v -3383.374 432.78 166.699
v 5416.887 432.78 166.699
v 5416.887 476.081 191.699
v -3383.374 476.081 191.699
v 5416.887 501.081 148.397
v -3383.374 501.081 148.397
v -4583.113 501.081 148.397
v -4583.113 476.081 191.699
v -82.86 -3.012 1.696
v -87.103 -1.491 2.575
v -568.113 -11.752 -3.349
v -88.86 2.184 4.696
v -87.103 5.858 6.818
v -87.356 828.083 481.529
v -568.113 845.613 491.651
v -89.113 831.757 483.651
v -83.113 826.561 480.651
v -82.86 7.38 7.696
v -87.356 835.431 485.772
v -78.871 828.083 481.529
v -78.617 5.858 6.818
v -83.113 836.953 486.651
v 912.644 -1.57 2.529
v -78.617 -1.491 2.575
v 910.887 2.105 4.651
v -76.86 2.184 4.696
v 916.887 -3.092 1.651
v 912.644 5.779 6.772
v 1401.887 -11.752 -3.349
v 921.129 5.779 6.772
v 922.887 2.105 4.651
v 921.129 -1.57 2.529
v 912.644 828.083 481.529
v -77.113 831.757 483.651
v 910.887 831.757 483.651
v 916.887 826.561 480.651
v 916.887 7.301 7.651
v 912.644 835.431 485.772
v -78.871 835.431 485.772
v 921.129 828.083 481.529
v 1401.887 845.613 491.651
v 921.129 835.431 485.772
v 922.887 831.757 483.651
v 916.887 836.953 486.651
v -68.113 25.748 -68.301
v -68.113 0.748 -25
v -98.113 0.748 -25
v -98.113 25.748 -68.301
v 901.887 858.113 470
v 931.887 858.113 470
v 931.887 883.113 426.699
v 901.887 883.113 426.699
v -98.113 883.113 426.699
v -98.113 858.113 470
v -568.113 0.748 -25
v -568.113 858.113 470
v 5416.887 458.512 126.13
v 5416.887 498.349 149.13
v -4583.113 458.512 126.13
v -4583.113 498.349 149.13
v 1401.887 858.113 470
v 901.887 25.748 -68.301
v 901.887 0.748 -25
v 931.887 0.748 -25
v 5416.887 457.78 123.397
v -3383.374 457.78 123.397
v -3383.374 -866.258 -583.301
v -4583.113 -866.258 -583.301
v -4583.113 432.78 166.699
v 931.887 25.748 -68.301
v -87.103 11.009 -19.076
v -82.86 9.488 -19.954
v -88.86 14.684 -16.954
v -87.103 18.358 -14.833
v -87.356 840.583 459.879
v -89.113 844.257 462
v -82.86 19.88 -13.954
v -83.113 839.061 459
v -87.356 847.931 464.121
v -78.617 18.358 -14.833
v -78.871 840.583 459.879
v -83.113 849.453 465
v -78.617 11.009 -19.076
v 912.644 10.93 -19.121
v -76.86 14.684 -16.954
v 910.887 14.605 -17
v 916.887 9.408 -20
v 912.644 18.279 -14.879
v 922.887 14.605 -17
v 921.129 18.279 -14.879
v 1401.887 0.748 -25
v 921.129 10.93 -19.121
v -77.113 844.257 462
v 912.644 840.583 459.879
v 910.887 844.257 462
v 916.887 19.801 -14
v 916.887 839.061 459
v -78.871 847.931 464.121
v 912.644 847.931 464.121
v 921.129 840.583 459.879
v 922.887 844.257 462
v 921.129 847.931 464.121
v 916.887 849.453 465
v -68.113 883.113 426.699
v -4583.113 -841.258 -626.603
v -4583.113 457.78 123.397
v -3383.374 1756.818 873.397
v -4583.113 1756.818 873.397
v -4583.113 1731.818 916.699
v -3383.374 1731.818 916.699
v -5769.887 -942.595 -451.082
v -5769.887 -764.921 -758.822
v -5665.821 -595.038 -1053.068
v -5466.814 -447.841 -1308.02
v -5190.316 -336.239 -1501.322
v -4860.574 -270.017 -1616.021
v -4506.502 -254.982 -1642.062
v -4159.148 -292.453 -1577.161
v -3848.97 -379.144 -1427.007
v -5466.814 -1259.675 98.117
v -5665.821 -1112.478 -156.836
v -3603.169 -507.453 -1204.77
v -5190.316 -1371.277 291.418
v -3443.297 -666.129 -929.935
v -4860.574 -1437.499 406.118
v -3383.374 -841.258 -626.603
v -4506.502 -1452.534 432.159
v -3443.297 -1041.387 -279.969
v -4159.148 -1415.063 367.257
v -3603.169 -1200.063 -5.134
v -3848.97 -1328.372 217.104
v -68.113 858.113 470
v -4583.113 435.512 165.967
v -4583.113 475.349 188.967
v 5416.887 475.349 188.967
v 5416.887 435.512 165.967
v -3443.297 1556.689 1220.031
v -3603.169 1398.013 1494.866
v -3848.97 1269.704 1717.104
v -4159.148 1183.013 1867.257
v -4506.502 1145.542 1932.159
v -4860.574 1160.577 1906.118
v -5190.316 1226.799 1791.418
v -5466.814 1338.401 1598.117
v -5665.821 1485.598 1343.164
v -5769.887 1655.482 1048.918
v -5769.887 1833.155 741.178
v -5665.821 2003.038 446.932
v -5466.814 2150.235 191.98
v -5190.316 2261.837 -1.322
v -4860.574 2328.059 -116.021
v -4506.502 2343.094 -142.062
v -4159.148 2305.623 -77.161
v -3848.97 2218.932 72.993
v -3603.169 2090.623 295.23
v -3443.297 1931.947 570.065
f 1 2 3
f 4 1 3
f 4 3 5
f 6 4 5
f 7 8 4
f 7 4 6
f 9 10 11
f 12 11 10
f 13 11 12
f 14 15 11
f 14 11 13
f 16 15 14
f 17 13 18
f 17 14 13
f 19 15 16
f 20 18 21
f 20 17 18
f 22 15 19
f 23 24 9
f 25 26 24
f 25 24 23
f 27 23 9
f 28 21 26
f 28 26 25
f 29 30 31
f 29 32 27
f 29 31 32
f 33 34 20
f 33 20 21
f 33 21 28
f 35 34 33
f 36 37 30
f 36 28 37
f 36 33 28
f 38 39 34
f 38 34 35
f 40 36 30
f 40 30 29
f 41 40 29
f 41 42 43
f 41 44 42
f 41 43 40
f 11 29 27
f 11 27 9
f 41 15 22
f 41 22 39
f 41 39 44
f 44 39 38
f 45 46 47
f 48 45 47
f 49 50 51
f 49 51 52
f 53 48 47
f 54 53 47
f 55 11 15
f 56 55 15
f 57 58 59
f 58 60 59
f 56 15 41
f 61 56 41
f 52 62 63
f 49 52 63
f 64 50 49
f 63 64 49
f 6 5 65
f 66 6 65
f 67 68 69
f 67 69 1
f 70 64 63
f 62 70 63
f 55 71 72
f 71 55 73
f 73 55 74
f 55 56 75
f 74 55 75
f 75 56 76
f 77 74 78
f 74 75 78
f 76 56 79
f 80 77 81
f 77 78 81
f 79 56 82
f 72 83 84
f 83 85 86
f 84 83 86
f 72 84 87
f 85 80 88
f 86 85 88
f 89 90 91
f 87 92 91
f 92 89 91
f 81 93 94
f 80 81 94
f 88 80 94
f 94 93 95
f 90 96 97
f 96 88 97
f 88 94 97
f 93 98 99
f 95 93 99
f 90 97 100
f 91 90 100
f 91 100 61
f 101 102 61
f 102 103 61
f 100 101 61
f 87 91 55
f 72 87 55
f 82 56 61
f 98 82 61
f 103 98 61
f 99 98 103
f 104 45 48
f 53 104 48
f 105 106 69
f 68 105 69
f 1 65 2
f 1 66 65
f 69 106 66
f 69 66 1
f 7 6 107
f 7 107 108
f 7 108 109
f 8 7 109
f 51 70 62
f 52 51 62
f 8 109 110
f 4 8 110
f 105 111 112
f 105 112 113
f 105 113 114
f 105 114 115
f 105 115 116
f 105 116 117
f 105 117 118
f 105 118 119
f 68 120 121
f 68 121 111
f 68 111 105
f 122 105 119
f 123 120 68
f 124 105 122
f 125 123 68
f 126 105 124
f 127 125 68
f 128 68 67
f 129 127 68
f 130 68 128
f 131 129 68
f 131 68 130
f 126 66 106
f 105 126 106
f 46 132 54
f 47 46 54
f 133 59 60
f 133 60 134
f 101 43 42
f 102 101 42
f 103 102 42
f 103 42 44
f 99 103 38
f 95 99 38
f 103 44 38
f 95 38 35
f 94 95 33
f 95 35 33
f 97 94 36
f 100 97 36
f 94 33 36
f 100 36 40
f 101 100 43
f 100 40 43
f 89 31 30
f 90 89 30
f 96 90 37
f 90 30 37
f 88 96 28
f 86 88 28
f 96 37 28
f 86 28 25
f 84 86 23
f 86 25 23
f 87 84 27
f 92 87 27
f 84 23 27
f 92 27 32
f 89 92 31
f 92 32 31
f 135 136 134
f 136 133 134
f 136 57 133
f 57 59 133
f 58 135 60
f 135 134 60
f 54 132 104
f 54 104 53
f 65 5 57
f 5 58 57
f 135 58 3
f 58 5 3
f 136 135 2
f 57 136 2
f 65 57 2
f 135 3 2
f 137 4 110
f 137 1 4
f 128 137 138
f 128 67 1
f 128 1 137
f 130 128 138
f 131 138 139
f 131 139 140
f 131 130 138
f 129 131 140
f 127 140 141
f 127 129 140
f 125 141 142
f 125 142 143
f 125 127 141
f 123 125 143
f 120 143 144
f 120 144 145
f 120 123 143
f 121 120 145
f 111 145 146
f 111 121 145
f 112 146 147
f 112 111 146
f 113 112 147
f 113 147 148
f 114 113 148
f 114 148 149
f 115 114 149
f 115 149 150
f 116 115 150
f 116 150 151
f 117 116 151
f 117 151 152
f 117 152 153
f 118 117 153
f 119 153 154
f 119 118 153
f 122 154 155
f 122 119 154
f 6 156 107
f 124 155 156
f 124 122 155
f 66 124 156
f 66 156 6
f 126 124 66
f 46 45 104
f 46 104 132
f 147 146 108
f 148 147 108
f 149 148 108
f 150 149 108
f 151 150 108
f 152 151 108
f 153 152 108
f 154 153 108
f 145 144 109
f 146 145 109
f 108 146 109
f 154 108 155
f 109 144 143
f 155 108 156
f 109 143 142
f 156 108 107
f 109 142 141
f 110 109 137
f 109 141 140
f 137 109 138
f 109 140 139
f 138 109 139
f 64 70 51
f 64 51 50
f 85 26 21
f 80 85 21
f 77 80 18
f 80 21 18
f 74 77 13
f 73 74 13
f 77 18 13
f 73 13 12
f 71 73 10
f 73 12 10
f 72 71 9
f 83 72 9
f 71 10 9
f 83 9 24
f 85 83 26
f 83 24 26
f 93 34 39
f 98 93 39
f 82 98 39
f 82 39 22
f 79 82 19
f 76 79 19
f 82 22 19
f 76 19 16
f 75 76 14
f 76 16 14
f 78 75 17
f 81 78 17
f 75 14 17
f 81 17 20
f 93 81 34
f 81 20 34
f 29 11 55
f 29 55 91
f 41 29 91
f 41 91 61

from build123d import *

# Parameters (mm, degrees)
F0_W          = 1970
F0_H          = 990
F0_R          = 6
F1_DEPTH      = 25
F2_ANGLE      = 30
F3_W          = 30
F3_H          = 50
F4_DEPTH      = 990
F6_DEPTH      = 4015
F6_DEPTH_BACK = 5985
F7_T          = -2
F9_DEPTH      = 1500


with BuildPart() as f1:
    # F0 (on Top) → F1 (new body)
    with BuildSketch(Plane.XY):
        with Locations((416.8867363036, 495.7481575012)):
            Rectangle(F0_W, F0_H)
        with Locations((-82.8598737717, 16.8394874781)):
            Circle(F0_R, mode=Mode.SUBTRACT)
        with Locations((916.8867363036, 16.7481575012)):
            Circle(F0_R, mode=Mode.SUBTRACT)
        with Locations((-83.1132636964, 974.7481575012)):
            Circle(F0_R, mode=Mode.SUBTRACT)
        with Locations((916.8867363036, 974.7481575012)):
            Circle(F0_R, mode=Mode.SUBTRACT)
    extrude(amount=-F1_DEPTH)


with BuildPart() as f1_1:
    # F2: moved
    add(f1.part.rotate(Axis((416.8867363036, 0.7481575012, -25), (1, 0, 0)), F2_ANGLE))


with BuildPart() as f4:
    # F3 (on face) → F4 (new body)
    with BuildSketch(Plane(origin=(0, 847.1009503252, 489.073961701), x_dir=(-1, 0, 0), z_dir=(0, 0.8660254038, 0.5))):
        with Locations((83.1132636964, -47.0247138452)):
            Rectangle(F3_W, F3_H)
    extrude(amount=-F4_DEPTH)


with BuildPart() as f4b:
    # F3 (on face) → F4, piece 2 (new body)
    with BuildSketch(Plane(origin=(0, 847.1009503252, 489.073961701), x_dir=(-1, 0, 0), z_dir=(0, 0.8660254038, 0.5))):
        with Locations((-916.8867363036, -47.0247138452)):
            Rectangle(F3_W, F3_H)
    extrude(amount=-F4_DEPTH)


with BuildPart() as f6:
    # F5 (on face) → F6 (new body, two sides)
    with BuildSketch(Plane(origin=(-568.1132636964, 0, 0), x_dir=(0, -1, 0), z_dir=(-1, 0, 0))) as f6_sk:
        Polygon((-432.7800972799, 166.6987298108), (-454.4307323745, 179.1987298108), (-476.0813674691, 191.6987298108), (-501.0813674691, 148.3974596216), (-457.7800972799, 123.3974596216), align=None)
    extrude(amount=F6_DEPTH)
    extrude(f6_sk.sketch, amount=-F6_DEPTH_BACK)

    # F7
    f7_openings = [f6.faces().sort_by_distance(p)[0] for p in [
        (-4583.113264, 466.930732, 157.548095),
        (5416.886736, 466.930732, 157.548095),
    ]]
    offset(amount=F7_T, openings=f7_openings)

    # F8 (on face) → F9 (join, symmetric)
    with BuildSketch(Plane(origin=(0, 396.7677403573, 229.073961701), x_dir=(1, 0, 0), z_dir=(0, -0.8660254038, -0.5))):
        with BuildLine():
            Line((-4583.1132636964, -72.0247138452), (-3383.3737086263, -72.0247138452))
            ThreePointArc((-3383.3737086262, -72.0247138452), (-5783.1132636964, -97.0247138452), (-3383.3737086262, -122.0247138453))
            Line((-3383.3737086263, -122.0247138452), (-4583.1132636964, -122.0247138452))
            Line((-4583.1132636964, -122.0247138452), (-4583.1132636964, -72.0247138452))
        make_face()
    extrude(amount=F9_DEPTH, both=True)


solid = Compound([f1_1.part, f4.part, f4b.part, f6.part])
